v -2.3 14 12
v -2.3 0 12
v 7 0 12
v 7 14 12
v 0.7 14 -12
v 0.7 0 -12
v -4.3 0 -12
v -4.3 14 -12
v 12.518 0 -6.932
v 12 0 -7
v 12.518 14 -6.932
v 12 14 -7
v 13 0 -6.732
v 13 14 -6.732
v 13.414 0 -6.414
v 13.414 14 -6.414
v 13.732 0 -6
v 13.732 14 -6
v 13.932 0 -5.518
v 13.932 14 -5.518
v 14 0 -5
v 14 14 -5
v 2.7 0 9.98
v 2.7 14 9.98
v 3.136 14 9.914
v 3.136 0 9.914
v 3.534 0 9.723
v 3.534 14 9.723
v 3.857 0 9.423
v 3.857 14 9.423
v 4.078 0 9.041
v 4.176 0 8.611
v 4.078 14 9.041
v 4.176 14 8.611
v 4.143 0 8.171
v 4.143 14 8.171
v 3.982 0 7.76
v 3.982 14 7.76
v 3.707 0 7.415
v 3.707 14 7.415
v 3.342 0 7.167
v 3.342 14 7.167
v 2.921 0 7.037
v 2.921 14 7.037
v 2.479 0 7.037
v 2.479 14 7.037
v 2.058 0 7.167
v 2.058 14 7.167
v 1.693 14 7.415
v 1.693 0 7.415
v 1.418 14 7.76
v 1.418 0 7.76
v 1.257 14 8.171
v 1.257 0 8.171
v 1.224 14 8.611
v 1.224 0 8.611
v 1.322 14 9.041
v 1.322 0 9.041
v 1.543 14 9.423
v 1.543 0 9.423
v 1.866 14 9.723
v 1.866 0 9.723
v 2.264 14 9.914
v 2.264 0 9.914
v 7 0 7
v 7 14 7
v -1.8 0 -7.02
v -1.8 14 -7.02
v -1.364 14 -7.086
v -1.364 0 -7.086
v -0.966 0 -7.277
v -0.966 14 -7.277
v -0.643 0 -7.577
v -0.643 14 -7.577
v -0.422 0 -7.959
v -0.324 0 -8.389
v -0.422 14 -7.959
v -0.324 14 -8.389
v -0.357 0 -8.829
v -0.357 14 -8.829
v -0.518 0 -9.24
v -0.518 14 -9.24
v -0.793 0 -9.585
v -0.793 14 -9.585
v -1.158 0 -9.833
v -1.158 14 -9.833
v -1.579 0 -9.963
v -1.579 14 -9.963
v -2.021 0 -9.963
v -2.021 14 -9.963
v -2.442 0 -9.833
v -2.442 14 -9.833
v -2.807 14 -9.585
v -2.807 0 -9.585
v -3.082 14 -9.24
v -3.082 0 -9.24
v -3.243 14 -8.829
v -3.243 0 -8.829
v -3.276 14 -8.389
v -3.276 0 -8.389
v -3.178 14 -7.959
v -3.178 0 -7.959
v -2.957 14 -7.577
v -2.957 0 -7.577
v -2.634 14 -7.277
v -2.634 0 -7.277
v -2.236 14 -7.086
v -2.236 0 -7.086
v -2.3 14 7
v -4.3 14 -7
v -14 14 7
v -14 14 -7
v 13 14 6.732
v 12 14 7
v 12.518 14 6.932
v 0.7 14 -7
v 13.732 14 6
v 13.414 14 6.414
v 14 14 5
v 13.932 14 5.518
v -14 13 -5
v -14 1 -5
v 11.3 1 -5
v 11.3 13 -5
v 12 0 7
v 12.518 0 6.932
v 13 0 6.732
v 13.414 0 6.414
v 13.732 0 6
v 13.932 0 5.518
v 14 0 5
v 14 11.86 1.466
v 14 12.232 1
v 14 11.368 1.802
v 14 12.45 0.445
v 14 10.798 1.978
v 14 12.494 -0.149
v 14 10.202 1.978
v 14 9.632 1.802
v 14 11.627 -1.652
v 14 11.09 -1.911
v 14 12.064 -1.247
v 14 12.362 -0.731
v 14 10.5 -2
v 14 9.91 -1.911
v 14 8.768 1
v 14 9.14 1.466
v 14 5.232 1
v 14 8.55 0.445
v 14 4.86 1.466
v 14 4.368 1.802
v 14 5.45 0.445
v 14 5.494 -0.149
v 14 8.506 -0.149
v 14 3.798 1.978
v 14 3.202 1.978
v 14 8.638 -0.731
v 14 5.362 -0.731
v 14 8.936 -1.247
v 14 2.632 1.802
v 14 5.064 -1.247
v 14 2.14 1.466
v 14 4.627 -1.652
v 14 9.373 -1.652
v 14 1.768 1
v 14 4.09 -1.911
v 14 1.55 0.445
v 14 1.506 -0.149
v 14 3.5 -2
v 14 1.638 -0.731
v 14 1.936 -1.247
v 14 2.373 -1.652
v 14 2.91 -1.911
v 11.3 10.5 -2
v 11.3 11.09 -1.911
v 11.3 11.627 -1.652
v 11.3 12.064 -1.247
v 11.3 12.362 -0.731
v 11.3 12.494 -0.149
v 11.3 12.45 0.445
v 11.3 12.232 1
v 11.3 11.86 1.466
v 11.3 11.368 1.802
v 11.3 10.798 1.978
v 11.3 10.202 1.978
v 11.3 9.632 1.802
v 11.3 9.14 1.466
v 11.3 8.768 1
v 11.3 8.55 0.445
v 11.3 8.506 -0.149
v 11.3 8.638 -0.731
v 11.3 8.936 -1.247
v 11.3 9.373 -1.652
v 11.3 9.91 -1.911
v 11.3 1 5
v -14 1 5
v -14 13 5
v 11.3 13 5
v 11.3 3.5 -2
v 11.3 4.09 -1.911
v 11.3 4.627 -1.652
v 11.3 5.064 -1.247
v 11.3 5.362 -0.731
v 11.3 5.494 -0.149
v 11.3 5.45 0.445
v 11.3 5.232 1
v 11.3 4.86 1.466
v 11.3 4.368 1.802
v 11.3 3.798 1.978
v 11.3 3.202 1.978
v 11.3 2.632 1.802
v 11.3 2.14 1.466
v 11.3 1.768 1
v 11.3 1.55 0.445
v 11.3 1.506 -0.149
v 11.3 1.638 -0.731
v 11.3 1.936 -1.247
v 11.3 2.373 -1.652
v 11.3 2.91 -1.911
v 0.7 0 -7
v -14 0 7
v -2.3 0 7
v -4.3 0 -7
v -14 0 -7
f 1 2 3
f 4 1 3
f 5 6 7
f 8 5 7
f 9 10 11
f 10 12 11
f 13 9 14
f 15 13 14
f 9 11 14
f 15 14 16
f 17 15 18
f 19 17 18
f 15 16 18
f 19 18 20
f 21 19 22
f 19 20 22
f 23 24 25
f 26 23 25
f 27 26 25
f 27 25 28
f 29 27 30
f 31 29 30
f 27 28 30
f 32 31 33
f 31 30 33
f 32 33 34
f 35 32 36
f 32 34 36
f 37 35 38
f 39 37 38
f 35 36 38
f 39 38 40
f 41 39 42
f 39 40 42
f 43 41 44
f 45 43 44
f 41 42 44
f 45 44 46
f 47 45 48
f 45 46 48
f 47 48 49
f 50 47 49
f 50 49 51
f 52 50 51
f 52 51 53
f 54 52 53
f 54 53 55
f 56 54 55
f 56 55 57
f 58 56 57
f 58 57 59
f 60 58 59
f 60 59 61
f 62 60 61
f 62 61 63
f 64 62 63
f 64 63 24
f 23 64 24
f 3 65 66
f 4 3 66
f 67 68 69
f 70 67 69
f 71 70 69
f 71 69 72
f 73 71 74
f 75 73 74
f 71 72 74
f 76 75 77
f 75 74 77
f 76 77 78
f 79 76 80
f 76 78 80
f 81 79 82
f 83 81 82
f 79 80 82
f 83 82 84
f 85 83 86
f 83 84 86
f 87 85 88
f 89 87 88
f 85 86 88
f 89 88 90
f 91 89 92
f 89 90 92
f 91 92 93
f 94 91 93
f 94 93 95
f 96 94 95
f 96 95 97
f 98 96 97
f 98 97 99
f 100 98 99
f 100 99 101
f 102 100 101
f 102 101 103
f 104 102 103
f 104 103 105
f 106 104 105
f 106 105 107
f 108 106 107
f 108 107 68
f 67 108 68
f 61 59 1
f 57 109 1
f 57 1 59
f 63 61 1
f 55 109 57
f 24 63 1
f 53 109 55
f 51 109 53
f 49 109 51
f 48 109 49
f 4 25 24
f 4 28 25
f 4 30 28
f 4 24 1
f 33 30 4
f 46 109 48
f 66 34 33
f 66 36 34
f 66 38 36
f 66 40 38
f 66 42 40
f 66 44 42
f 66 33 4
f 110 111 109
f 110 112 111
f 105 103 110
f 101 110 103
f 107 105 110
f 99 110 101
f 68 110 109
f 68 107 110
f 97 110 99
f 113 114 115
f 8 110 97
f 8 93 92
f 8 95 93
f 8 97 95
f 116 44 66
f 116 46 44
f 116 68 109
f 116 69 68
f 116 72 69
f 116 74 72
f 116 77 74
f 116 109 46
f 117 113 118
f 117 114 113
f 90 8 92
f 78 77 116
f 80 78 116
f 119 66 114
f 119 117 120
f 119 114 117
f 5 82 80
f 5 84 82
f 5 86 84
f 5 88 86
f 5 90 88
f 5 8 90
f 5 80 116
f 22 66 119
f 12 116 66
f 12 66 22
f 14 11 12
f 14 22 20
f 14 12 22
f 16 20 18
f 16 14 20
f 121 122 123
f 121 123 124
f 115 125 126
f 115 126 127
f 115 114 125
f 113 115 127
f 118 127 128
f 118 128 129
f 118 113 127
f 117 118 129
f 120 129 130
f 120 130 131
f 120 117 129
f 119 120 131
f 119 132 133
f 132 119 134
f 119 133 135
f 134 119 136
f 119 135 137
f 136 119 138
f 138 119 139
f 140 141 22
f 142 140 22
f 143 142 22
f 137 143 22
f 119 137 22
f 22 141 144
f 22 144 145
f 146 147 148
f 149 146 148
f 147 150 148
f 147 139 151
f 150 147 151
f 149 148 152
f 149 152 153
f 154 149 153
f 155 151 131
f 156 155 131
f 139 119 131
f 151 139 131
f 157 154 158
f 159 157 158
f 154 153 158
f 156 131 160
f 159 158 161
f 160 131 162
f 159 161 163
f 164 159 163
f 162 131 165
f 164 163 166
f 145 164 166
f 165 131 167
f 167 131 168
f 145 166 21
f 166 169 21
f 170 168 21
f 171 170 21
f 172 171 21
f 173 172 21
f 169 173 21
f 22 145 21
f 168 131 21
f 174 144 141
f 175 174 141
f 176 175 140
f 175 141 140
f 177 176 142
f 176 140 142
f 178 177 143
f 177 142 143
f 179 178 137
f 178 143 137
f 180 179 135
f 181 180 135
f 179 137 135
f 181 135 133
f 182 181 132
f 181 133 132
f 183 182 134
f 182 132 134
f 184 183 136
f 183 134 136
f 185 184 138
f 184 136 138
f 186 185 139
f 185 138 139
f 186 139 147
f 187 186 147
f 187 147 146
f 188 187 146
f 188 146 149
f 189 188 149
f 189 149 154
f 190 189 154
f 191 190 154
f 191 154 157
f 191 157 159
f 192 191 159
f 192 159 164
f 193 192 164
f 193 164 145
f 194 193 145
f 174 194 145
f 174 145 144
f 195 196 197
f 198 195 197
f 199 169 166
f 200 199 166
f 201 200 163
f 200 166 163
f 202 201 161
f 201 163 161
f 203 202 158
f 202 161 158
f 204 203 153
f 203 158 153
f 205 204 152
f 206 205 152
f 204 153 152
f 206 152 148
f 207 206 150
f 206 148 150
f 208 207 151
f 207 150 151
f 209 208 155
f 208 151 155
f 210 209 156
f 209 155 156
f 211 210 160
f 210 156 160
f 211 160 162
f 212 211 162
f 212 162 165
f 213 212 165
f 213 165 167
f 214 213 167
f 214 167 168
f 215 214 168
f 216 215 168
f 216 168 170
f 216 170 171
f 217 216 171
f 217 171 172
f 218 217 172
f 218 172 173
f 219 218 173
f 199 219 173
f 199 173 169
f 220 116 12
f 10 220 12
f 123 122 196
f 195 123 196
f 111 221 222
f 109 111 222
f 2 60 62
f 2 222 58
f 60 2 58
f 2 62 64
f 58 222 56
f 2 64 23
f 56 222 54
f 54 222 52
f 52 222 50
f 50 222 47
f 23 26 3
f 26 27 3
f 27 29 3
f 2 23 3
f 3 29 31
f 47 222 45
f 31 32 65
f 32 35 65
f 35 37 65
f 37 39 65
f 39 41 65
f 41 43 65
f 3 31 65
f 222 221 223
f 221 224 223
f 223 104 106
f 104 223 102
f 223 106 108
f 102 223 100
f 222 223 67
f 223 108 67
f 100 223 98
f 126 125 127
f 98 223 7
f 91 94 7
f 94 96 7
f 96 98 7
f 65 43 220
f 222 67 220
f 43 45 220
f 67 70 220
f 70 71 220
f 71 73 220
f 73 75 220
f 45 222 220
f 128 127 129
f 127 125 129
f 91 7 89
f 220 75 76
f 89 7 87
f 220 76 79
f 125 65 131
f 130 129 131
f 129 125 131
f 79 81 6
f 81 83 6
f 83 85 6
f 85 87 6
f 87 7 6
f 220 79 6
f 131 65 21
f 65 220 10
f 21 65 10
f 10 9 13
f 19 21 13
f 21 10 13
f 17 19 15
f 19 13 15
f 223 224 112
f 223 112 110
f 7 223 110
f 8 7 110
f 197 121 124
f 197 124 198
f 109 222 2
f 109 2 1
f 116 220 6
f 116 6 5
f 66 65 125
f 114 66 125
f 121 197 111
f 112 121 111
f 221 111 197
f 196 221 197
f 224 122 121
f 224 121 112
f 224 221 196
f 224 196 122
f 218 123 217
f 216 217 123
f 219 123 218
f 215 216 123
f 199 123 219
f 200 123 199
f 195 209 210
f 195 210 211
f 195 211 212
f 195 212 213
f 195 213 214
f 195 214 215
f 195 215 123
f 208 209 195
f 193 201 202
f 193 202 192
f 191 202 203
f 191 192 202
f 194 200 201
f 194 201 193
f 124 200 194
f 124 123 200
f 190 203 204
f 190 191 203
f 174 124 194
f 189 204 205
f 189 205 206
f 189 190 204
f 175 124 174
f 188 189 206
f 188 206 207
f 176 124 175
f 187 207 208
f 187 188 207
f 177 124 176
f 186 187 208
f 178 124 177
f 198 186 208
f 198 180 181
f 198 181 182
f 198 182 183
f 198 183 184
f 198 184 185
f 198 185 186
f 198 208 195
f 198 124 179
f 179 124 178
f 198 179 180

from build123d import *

# Parameters (mm, degrees)
SKETCH_1_W          = 28
SKETCH_1_H          = 14
EXTRUDE_1_DEPTH     = 14
SKETCH_2_W          = 10
SKETCH_2_H          = 12
CUT_EXTRUDE_1_DEPTH = 25.3
SKETCH_3_R          = 2
CUT_EXTRUDE_2_DEPTH = 25.5
FILLET_4_R          = 2
SKETCH_4_W          = 9.3
SKETCH_4_H          = 14
EXTRUDE_2_DEPTH     = 5
SKETCH_5_W          = 5
SKETCH_5_H          = 14
EXTRUDE_3_DEPTH     = 5
SKETCH_6_R          = 1.48
CUT_EXTRUDE_3_DEPTH = 20


with BuildPart() as part:
    # 草图1 → 凸台-拉伸1 (new body)
    with BuildSketch(Plane(origin=(0, 0, 0), x_dir=(1, 0, 0), z_dir=(0, 1, 0))):
        Rectangle(SKETCH_1_W, SKETCH_1_H)
    extrude(amount=EXTRUDE_1_DEPTH)

    # 草图2 → 切除-拉伸1 (cut)
    with BuildSketch(Plane.ZY.offset(14)):
        with Locations((0, 7)):
            Rectangle(SKETCH_2_W, SKETCH_2_H)
    extrude(amount=-CUT_EXTRUDE_1_DEPTH, mode=Mode.SUBTRACT)

    # 草图3 → 切除-拉伸2 (cut)
    with BuildSketch(Plane(origin=(14, 0, 0), x_dir=(0, 0, -1), z_dir=(1, 0, 0))):
        with Locations((0, 10.5)):
            Circle(SKETCH_3_R)
        with Locations((0, 3.5)):
            Circle(SKETCH_3_R)
    extrude(amount=-CUT_EXTRUDE_2_DEPTH, mode=Mode.SUBTRACT)

    # 圆角4
    fillet_4_edges = [part.edges().sort_by_distance(p)[0] for p in [
        (14, 7, 7),
        (14, 7, -7),
    ]]
    fillet(fillet_4_edges, radius=FILLET_4_R)

    # 草图4 → 凸台-拉伸2 (add)
    with BuildSketch(Plane.XY.offset(7)):
        with Locations((2.35, 7)):
            Rectangle(SKETCH_4_W, SKETCH_4_H)
    extrude(amount=EXTRUDE_2_DEPTH)

    # 草图5 → 凸台-拉伸3 (add)
    with BuildSketch(Plane(origin=(0, 0, -7), x_dir=(-1, 0, 0), z_dir=(0, 0, -1))):
        with Locations((1.8, 7)):
            Rectangle(SKETCH_5_W, SKETCH_5_H)
    extrude(amount=EXTRUDE_3_DEPTH)

    # 草图6 → 切除-拉伸3 (cut)
    with BuildSketch(Plane(origin=(0, 14, 0), x_dir=(1, 0, 0), z_dir=(0, 1, 0))):
        with Locations(Location((2.7, -8.5, 0), (0, 0, 270))):
            Circle(SKETCH_6_R)
        with Locations(Location((-1.8, 8.5, 0), (0, 0, 270))):
            Circle(SKETCH_6_R)
    extrude(amount=-CUT_EXTRUDE_3_DEPTH, mode=Mode.SUBTRACT)


solid = part.part
